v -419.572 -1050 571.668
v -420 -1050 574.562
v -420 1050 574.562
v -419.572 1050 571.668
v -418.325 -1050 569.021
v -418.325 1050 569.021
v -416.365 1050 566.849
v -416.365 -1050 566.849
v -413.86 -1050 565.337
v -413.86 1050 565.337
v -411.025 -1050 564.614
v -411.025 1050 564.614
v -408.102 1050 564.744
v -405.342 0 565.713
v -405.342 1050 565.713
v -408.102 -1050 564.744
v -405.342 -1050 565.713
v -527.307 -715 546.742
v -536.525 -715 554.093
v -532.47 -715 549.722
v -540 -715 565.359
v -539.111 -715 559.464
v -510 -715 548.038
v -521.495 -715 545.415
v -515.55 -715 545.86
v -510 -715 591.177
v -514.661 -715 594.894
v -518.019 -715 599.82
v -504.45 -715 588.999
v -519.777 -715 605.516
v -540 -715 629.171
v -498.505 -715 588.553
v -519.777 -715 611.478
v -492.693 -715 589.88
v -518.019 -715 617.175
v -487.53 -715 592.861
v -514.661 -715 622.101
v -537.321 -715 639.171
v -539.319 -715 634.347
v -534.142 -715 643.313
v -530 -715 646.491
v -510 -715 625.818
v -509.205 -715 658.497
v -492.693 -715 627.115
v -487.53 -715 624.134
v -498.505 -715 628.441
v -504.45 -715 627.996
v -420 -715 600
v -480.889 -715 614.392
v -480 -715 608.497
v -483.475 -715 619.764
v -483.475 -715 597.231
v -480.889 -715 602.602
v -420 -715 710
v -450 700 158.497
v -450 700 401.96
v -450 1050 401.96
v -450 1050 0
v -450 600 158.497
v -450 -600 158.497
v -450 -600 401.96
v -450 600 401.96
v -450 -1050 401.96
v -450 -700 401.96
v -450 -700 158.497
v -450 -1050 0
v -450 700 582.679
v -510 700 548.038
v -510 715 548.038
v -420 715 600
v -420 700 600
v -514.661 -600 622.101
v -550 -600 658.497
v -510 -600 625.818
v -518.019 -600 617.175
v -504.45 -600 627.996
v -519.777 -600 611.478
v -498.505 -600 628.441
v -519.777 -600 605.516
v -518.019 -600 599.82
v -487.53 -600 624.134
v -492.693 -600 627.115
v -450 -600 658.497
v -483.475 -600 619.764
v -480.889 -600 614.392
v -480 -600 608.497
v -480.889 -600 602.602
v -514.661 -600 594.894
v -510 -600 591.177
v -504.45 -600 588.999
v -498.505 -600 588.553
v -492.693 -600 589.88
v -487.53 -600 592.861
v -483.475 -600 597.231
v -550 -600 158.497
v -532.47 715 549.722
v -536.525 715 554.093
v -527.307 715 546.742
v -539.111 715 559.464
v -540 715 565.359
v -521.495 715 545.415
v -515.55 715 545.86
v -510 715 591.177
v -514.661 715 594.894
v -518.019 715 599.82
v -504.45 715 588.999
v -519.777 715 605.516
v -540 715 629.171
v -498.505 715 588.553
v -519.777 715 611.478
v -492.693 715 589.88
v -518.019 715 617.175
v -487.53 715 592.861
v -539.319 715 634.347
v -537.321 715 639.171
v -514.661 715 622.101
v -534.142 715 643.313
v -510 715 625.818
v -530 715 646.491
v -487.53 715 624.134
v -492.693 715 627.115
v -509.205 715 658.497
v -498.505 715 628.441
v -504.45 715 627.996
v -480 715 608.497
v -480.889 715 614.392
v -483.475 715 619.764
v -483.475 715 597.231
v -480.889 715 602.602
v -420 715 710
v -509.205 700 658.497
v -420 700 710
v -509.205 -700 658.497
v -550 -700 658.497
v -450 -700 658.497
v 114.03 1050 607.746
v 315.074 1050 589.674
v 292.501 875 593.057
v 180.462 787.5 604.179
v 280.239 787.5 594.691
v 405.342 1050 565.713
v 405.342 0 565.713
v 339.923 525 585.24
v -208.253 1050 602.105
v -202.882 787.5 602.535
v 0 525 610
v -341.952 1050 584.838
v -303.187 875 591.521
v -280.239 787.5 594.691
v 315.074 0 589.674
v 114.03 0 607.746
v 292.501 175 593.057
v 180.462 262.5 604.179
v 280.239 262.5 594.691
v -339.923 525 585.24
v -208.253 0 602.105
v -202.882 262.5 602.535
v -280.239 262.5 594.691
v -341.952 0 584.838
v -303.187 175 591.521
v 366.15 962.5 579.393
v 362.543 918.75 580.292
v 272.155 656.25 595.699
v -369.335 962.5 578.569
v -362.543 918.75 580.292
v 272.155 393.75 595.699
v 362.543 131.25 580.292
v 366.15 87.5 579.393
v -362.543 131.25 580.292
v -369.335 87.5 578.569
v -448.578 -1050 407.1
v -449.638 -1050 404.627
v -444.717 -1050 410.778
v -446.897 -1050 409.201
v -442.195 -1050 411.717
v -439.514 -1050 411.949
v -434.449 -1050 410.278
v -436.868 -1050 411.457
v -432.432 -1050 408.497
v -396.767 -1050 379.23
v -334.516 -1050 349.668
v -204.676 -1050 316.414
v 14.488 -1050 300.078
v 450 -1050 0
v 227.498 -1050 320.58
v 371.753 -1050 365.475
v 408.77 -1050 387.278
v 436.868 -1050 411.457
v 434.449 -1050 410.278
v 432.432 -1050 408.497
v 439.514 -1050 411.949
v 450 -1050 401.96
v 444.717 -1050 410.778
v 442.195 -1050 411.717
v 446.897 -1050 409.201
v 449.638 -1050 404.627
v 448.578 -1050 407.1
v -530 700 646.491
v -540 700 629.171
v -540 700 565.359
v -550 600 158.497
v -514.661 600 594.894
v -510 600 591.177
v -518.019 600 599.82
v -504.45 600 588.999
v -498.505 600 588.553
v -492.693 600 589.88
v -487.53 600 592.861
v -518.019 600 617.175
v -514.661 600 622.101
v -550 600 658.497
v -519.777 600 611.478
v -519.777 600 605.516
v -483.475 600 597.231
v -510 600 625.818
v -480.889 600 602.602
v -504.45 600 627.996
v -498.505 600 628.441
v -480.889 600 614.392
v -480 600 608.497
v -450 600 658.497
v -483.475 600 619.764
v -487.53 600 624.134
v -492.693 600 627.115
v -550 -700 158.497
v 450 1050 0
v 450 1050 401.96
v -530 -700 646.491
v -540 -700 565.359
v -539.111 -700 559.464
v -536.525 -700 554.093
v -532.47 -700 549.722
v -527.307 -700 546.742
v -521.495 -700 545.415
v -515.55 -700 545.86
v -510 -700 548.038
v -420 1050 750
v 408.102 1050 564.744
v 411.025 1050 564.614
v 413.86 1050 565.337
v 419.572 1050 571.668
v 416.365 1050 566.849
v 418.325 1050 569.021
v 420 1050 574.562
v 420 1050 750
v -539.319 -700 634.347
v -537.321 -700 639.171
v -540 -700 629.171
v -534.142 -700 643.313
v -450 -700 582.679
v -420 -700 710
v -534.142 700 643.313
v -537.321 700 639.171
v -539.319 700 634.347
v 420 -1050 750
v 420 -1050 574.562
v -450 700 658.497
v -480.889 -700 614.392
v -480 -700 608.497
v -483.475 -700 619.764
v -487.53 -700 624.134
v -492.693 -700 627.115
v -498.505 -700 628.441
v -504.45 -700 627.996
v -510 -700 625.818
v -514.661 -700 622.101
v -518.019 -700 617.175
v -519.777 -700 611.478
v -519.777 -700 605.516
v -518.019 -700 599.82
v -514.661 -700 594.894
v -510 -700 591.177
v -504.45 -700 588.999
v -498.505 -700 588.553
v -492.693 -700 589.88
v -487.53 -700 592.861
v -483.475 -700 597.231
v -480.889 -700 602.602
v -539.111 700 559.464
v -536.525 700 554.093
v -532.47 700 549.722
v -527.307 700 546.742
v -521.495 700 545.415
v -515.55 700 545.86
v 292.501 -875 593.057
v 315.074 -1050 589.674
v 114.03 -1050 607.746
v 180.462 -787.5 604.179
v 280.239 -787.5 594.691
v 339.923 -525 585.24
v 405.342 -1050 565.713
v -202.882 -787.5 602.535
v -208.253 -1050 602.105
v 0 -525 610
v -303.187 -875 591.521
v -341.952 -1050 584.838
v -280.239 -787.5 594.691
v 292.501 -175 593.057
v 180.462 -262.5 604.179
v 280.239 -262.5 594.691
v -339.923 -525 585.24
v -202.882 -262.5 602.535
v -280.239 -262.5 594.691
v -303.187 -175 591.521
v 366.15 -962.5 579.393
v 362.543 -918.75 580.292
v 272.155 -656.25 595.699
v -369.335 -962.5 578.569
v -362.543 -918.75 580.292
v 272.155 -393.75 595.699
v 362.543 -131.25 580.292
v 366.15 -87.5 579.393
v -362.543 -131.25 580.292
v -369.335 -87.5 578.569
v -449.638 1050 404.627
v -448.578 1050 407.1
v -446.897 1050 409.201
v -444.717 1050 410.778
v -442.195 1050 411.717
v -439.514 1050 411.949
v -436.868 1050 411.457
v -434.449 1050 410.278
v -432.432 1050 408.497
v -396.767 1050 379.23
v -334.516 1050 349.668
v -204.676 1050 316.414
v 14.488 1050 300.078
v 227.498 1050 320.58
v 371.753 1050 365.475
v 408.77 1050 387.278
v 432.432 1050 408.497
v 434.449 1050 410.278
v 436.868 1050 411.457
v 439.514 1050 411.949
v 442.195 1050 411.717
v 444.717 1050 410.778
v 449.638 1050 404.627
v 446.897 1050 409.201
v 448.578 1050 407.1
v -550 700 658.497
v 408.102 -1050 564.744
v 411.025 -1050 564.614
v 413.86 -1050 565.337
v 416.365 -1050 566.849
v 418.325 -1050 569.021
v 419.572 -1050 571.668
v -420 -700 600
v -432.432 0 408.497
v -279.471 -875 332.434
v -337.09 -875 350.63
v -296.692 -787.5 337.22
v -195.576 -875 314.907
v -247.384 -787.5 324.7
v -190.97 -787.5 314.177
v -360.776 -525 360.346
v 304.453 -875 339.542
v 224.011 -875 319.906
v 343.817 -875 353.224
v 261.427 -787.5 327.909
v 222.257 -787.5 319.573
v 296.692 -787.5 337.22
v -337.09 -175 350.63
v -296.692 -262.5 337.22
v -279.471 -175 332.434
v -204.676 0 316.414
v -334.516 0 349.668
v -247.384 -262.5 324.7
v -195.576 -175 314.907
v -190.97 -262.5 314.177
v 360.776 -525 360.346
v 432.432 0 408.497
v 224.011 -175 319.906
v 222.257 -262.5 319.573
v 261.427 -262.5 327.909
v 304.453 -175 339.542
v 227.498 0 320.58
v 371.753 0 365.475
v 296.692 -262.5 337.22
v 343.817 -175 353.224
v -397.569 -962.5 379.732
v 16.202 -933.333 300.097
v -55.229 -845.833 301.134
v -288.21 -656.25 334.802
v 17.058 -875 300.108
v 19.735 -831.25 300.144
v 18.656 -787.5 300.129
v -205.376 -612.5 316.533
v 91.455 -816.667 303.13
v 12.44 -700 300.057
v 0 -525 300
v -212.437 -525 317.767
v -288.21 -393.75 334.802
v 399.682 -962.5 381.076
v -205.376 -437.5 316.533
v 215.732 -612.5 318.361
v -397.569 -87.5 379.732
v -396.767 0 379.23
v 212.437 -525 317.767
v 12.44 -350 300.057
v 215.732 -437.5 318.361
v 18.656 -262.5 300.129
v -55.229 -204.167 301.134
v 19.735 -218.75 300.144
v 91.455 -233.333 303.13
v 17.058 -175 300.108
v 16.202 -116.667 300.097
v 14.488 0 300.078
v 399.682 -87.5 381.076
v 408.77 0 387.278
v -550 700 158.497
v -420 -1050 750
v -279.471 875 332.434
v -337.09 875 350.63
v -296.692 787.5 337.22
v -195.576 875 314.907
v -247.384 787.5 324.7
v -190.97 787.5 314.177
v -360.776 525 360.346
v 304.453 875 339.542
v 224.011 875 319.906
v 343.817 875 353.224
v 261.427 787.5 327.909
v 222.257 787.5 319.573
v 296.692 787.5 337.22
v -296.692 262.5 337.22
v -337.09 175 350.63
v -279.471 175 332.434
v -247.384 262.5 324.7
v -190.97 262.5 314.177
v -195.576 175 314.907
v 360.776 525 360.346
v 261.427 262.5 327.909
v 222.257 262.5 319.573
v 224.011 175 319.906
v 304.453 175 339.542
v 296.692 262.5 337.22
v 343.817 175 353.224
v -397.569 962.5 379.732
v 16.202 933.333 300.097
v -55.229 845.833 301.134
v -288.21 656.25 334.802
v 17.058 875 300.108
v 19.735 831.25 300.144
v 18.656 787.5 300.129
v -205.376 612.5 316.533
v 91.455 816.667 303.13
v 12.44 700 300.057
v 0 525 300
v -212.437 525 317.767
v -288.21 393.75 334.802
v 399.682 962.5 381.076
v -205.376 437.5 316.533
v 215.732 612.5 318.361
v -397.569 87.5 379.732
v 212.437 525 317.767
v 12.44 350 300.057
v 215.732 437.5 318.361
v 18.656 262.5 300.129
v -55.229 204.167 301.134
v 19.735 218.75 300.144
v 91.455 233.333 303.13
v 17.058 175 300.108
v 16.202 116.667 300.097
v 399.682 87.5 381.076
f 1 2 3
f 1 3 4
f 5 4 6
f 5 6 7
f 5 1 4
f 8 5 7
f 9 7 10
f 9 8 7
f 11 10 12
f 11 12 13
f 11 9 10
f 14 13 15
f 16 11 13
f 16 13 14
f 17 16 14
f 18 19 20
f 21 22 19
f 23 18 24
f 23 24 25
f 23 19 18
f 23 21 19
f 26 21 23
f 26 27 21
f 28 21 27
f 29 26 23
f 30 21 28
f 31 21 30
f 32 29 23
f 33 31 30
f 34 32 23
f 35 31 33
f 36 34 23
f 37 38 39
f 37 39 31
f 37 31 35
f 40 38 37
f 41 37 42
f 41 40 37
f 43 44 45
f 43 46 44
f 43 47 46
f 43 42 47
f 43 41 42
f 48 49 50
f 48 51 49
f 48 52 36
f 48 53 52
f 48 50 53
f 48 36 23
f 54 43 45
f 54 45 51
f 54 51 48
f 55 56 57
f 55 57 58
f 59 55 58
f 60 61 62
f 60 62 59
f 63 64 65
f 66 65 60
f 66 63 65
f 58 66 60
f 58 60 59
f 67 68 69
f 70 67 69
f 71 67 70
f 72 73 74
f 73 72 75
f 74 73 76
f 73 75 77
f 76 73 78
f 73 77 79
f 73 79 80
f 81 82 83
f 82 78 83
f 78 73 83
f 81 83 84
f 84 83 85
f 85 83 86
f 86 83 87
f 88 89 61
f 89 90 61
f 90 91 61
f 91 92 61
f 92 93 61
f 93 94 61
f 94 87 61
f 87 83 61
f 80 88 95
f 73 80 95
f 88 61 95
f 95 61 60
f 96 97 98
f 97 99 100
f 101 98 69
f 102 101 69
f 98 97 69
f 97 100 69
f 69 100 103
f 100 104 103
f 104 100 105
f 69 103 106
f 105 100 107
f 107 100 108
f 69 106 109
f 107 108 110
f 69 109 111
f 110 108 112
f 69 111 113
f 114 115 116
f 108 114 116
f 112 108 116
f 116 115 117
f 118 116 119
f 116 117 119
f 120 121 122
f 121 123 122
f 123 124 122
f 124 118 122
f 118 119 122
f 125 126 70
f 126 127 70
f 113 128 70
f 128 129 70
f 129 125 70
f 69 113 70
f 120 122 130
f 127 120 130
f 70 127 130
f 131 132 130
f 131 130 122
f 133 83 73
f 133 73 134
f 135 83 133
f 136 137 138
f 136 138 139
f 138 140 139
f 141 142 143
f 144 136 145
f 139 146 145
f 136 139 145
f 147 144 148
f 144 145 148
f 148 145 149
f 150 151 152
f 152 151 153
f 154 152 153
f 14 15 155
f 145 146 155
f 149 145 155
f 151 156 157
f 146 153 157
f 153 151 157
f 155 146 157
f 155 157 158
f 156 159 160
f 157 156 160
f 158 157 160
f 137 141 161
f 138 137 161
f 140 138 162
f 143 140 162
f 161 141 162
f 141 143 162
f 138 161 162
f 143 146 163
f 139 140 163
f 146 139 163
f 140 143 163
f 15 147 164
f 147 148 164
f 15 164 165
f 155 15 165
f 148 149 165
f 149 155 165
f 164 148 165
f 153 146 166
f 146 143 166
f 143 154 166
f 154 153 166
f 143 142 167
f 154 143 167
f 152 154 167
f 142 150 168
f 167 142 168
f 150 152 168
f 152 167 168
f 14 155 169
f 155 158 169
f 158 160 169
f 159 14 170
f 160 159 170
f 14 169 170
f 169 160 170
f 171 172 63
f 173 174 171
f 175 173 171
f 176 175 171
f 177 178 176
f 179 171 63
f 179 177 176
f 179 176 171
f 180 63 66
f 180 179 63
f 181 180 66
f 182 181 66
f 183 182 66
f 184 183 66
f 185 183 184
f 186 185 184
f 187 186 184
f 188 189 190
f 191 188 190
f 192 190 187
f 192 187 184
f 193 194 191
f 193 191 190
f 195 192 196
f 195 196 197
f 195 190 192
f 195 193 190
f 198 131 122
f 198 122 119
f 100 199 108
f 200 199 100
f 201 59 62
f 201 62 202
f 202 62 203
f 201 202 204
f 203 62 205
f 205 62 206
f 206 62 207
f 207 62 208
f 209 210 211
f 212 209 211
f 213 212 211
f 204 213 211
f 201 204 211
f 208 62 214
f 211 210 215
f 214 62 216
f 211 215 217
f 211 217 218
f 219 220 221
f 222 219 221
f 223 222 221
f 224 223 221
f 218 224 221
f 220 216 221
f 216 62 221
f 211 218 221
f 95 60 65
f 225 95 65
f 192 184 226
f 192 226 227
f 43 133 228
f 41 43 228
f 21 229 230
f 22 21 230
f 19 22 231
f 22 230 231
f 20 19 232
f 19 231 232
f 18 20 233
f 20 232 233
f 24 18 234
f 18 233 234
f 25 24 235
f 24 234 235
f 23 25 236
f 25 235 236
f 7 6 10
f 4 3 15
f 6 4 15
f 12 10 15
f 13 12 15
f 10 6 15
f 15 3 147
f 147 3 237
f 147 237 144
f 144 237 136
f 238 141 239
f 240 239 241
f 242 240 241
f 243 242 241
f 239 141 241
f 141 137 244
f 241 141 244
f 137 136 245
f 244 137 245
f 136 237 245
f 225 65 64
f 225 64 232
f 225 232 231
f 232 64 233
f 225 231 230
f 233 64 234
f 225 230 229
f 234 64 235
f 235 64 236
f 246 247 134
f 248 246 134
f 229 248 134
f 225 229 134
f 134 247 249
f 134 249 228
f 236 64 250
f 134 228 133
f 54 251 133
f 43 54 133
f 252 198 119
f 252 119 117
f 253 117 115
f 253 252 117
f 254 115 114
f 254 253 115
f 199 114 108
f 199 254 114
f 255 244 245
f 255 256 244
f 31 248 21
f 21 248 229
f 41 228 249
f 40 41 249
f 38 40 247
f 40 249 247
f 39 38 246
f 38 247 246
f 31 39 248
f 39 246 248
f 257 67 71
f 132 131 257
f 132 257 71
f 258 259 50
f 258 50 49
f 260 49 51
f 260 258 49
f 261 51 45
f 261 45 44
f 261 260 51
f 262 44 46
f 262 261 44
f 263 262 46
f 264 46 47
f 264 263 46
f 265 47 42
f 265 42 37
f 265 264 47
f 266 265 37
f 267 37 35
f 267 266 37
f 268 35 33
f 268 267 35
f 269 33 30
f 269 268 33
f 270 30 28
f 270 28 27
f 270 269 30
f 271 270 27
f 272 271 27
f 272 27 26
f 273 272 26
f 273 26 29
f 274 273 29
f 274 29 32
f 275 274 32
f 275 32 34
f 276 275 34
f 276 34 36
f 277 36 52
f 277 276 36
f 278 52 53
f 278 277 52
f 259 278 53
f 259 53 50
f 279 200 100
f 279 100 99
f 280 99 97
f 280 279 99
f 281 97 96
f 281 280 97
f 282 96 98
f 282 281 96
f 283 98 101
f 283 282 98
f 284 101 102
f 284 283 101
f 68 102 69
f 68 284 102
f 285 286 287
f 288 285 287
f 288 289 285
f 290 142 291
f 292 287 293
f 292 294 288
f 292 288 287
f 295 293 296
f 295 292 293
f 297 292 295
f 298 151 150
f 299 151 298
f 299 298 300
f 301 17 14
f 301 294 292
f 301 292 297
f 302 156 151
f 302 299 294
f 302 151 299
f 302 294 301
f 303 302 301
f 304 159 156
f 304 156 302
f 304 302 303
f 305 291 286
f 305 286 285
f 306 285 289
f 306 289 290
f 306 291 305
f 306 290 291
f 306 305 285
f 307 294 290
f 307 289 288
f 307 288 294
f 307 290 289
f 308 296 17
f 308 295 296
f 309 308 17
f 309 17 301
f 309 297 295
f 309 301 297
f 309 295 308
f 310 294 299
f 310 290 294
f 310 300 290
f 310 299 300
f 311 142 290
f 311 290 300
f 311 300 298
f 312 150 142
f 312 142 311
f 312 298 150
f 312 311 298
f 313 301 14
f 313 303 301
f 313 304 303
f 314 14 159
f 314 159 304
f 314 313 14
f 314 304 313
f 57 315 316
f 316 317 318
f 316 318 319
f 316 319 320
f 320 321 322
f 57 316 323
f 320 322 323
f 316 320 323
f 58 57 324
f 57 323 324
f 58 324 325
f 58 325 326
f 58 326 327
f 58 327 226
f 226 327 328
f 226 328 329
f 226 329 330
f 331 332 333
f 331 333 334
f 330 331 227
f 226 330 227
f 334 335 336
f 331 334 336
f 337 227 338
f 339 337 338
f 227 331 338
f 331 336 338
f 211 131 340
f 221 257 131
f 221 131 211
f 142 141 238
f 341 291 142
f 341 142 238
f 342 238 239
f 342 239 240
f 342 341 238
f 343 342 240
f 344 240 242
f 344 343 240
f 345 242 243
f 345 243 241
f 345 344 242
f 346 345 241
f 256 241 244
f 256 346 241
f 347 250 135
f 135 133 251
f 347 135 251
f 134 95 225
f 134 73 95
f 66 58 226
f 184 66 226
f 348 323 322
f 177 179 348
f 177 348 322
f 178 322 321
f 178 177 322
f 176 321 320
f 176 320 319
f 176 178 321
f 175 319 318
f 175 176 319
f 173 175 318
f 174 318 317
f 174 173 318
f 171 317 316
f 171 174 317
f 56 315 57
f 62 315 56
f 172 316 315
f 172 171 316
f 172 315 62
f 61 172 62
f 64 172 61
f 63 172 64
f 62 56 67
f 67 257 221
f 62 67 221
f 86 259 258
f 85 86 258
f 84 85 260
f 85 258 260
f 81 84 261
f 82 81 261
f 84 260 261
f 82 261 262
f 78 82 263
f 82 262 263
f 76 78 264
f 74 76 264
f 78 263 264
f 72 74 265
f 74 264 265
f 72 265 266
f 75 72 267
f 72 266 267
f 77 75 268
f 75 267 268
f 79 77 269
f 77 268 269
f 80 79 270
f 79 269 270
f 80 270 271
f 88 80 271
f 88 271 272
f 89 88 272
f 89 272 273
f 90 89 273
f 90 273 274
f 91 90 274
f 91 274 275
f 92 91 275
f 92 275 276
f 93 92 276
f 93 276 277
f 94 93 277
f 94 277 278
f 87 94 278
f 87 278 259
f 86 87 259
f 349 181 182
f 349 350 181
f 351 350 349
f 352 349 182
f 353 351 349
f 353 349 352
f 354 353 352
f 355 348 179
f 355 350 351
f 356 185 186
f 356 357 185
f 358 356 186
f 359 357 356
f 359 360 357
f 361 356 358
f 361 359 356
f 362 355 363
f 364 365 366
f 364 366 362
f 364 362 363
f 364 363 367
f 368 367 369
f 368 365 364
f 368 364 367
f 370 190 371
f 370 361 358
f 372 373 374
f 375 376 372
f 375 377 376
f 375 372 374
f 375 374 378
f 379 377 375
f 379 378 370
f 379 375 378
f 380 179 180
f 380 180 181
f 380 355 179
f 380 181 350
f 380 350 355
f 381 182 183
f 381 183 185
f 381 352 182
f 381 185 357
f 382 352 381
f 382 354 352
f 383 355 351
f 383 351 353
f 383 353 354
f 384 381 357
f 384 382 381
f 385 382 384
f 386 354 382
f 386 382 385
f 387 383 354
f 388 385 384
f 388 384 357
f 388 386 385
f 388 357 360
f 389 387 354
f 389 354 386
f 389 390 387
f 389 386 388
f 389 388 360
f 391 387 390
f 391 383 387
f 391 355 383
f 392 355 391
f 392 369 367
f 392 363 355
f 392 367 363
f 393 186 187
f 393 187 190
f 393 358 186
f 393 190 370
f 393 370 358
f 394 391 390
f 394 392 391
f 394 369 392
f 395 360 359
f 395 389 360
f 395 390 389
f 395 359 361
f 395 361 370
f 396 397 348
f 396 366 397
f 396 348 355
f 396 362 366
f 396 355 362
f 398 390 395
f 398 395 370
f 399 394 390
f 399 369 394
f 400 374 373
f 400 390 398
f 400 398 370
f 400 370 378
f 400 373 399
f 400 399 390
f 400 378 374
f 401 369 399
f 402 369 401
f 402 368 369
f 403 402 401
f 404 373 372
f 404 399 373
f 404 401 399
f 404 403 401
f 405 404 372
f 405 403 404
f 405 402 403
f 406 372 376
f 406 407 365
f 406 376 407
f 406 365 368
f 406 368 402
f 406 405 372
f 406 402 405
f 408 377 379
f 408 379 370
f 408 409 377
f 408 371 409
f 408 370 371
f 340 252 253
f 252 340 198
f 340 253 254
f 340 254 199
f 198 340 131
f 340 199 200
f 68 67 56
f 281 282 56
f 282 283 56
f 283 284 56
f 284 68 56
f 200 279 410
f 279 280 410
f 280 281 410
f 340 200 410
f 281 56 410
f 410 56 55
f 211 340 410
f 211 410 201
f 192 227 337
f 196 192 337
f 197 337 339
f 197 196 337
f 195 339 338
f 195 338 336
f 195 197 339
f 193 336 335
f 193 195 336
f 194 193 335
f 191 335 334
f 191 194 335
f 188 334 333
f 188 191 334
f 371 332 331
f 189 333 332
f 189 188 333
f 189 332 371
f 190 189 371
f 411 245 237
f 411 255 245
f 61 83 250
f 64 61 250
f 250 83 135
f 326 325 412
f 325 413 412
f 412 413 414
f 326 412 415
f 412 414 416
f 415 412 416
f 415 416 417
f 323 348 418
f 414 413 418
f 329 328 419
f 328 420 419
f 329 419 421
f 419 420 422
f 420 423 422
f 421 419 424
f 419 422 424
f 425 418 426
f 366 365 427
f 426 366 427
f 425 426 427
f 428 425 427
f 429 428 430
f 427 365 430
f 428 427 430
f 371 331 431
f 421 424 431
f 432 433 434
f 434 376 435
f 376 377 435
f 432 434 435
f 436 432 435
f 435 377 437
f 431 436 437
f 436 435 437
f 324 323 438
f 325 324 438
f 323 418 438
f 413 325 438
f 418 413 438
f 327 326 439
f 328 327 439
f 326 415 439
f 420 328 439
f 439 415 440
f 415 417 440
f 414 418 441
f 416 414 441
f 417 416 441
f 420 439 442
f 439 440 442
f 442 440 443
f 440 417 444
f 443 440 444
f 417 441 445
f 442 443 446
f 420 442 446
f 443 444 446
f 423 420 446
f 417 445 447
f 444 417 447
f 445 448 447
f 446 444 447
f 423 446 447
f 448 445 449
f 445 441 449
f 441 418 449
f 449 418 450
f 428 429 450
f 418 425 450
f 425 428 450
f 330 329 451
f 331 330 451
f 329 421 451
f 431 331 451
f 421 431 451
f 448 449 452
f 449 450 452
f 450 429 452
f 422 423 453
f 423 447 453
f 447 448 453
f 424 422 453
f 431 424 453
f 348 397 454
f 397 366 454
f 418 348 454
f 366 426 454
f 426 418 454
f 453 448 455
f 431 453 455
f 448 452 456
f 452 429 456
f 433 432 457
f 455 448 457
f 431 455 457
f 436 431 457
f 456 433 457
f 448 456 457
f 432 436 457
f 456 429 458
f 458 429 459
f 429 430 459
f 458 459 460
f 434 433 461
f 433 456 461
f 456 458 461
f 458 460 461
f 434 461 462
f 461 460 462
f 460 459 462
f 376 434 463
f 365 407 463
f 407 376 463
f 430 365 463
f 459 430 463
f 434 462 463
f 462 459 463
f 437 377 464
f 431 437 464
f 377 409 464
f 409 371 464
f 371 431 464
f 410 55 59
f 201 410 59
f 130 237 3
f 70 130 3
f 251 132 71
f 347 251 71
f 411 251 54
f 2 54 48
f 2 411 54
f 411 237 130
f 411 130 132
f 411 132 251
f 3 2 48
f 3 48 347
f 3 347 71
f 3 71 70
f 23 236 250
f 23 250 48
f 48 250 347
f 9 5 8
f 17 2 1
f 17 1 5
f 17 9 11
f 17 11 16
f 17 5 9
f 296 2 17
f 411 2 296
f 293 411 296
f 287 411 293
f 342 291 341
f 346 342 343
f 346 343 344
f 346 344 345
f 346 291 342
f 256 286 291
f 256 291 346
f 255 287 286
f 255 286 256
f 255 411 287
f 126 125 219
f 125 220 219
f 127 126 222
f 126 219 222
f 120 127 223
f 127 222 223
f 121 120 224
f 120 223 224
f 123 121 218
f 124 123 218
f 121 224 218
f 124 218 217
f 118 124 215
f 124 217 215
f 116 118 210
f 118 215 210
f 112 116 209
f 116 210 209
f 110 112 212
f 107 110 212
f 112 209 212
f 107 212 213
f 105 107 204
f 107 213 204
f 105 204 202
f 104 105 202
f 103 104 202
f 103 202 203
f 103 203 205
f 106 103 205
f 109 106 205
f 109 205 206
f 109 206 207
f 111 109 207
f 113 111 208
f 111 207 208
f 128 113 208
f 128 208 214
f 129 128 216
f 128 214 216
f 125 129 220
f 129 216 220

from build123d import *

# Parameters (mm, degrees)
F1_DEPTH      = 1050
F1_DEPTH_BACK = 1050
F2_W          = 100
F2_H          = 256.5368058683
F2_H_2        = 243.4631941317
F3_DEPTH      = 100
F4_R          = 20
F5_DEPTH      = 1400
F7_DEPTH      = 1050
F7_DEPTH_BACK = 1050
F8_R          = 20
F9_DEPTH      = 15


with BuildPart() as f1:
    # F0 (on Front) → F1 (new body, two sides)
    with BuildSketch(Plane.XZ) as f1_sk:
        with BuildLine():
            Line((-450, 0), (0, 0))
            Line((0, 0), (450, 0))
            Line((450, 0), (450, 401.9604354327))
            ThreePointArc((450, 401.9604354327), (443.487330164, 411.3326565317), (432.4322943345, 408.4972413011))
            add(Edge.make_bspline(
                [(-432.4322943345, 408.4972413011), (4.257e-07, -92.1326371016), (432.4322943997, 408.4972413765)],
                knots=[3.4219354285, 3.4219354285, 3.4219354285, 6.0028425328, 6.0028425328, 6.0028425328], degree=2, weights=[1, 0.2766850577, 1]))
            ThreePointArc((-432.4322943345, 408.4972413011), (-443.487330164, 411.3326565317), (-450, 401.9604354327))
            Line((-450, 401.9604354327), (-450, 0))
        make_face()
    extrude(amount=F1_DEPTH)
    extrude(f1_sk.sketch, amount=-F1_DEPTH_BACK)

    # F2 (on face) → F3 (join)
    with BuildSketch(Plane(origin=(-450, 0, 0), x_dir=(0, -1, 0), z_dir=(-1, 0, 0))):
        with Locations((-650, 530.2288383669)):
            Rectangle(F2_W, F2_H)
        with Locations((-650, 280.2288383669)):
            Rectangle(F2_W, F2_H_2)
        with Locations((650, 280.2288383669)):
            Rectangle(F2_W, F2_H_2)
        with Locations((650, 530.2288383669)):
            Rectangle(F2_W, F2_H)
    extrude(amount=F3_DEPTH)

    # F4 (on face) → F5 (cut, through all)
    with BuildSketch(Plane.XZ.offset(700)):
        with Locations((-500, 608.4972413011)):
            Circle(F4_R)
    extrude(amount=-F5_DEPTH, mode=Mode.SUBTRACT)



with BuildPart() as f7:
    # F6 (on Front) → F7 (new body, two sides)
    with BuildSketch(Plane.XZ) as f7_sk:
        with BuildLine():
            Line((420, 750), (0, 750))
            Line((0, 750), (-420, 750))
            Line((-420, 750), (-420, 574.5617983004))
            ThreePointArc((-420, 574.5617983004), (-415.1679597445, 566.0007123834), (-405.3415615842, 565.7131288227))
            add(Edge.make_bspline(
                [(405.3415615842, 565.7131288227), (0, 779.1077760916), (-405.3415615842, 565.7131288227)],
                knots=[0.2649753519, 0.2649753519, 0.2649753519, 2.8766173017, 2.8766173017, 2.8766173017], degree=2, weights=[1, 0.2618854804, 1]))
            ThreePointArc((405.3415615842, 565.7131288227), (415.1679597445, 566.0007123834), (420, 574.5617983004))
            Line((420, 574.5617983004), (420, 750))
        make_face()
    extrude(amount=F7_DEPTH)
    extrude(f7_sk.sketch, amount=-F7_DEPTH_BACK)


with BuildPart() as f1_1:
    add(f1.part)

    add(f7.part)  # F9 merges F7
    # F8 (on face) → F9 (join)
    with BuildSketch(Plane.XZ.offset(700)):
        Polygon((-420, 600), (-420, 710), (-509.2053947965, 658.4972413011), (-450, 658.4972413011), (-450, 582.6794919243), align=None)
        with BuildLine():
            Line((-450, 658.4972413011), (-509.2053947965, 658.4972413011))
            Line((-509.2053947965, 658.4972413011), (-530, 646.4914703891))
            ThreePointArc((-530, 646.4914703891), (-537.3205080757, 639.1709623135), (-540, 629.1709623135))
            Line((-540, 629.1709623135), (-540, 565.3589838486))
            ThreePointArc((-540, 565.3589838486), (-530, 548.0384757729), (-510, 548.0384757729))
            Line((-510, 548.0384757729), (-450, 582.6794919243))
            Line((-450, 582.6794919243), (-450, 658.4972413011))
        make_face()
        with Locations((-500, 608.4972413011)):
            Circle(F8_R, mode=Mode.SUBTRACT)
    extrude(amount=F9_DEPTH)

    # F10: F1 across plane


with BuildPart() as f1_2:
    add(f1_1.part)
    add(f1_1.part.mirror(Plane.XZ))


solid = f1_2.part
